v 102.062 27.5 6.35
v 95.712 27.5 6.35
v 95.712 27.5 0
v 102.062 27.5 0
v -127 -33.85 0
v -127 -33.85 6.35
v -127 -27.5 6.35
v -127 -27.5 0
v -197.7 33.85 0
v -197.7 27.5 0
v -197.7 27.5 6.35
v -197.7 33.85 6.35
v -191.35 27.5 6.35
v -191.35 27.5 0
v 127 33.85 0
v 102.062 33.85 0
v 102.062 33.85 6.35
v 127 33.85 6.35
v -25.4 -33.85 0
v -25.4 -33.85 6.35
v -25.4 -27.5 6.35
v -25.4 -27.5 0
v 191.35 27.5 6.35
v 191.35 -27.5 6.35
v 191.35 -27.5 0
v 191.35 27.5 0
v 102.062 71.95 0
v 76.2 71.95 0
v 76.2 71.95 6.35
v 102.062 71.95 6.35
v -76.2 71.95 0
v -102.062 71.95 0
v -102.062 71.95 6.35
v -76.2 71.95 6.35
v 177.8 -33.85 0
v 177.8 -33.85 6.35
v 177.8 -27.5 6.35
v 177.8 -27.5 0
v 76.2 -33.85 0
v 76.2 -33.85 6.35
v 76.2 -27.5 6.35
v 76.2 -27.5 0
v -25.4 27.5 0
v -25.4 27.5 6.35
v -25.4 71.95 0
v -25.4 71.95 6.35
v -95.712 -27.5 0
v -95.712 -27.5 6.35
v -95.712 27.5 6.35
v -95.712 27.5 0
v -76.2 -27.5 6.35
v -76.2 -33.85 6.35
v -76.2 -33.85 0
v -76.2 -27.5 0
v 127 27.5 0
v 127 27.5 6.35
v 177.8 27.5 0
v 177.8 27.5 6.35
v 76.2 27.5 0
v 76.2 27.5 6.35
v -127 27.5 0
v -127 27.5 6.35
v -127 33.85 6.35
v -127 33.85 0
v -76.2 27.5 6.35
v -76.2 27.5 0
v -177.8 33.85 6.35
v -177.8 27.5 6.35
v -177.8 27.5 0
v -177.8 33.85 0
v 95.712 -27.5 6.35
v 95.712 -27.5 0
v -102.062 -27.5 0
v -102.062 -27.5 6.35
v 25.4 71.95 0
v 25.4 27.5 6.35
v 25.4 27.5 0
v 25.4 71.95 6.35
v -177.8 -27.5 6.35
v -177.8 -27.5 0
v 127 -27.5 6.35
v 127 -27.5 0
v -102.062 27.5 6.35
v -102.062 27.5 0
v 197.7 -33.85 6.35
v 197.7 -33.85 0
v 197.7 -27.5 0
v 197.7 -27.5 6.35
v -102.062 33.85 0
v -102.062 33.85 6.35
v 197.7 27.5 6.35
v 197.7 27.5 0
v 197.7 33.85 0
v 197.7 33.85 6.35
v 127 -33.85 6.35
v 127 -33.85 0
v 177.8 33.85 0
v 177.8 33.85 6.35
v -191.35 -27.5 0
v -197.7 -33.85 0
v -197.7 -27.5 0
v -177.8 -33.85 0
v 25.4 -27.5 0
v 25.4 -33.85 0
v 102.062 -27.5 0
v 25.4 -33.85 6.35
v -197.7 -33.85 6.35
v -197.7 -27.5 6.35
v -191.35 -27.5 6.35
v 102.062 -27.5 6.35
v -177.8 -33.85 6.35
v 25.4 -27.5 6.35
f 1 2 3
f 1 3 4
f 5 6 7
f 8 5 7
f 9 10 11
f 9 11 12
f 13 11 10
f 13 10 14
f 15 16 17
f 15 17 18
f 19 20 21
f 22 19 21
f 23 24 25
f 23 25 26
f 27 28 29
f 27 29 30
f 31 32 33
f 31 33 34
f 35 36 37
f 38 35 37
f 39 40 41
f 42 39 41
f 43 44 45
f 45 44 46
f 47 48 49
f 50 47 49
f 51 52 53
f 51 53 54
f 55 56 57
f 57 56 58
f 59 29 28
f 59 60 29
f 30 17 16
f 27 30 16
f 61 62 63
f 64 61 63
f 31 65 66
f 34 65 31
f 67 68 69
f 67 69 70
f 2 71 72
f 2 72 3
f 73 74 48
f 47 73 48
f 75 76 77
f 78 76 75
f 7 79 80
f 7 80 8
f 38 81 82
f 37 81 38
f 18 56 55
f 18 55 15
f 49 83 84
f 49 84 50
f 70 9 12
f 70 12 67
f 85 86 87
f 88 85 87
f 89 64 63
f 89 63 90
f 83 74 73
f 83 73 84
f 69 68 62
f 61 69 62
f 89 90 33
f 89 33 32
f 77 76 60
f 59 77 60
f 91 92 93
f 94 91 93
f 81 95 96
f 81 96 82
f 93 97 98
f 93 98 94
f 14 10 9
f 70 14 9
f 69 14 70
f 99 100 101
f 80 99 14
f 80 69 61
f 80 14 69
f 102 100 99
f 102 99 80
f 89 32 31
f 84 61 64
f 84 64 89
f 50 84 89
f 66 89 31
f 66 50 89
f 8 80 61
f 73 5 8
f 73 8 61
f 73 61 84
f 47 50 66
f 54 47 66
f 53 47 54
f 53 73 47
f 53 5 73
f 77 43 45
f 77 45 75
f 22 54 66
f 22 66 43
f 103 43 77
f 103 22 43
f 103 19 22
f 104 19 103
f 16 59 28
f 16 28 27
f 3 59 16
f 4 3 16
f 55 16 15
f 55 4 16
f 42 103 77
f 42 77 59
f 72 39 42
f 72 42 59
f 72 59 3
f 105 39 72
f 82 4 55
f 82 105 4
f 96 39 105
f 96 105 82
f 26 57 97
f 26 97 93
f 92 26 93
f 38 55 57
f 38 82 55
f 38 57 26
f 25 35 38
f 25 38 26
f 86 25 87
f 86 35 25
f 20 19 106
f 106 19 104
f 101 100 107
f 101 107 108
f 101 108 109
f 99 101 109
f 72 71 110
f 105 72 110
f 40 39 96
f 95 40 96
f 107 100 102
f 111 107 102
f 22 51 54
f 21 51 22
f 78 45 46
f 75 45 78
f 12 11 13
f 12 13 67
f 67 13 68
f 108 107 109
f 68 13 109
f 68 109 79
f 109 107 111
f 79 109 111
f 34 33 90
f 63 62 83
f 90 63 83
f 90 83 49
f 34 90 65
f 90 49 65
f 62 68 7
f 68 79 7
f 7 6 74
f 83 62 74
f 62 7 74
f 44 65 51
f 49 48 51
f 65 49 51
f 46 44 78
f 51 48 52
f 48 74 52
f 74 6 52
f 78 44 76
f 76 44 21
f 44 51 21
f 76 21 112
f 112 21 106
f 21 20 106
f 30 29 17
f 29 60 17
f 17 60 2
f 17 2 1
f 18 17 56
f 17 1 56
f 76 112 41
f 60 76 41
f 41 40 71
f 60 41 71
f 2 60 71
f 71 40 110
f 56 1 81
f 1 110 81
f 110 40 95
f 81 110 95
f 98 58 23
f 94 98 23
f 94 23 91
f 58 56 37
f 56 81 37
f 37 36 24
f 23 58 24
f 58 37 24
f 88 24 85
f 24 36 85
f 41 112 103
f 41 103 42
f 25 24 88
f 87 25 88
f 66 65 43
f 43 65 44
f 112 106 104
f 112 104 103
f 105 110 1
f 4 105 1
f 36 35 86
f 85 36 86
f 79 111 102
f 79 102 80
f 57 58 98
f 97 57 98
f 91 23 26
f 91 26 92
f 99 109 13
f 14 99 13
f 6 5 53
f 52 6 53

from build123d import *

# Parameters (mm, degrees)
SKETCH1_W           = 395.4
SKETCH1_H           = 67.700000012
BOSS_EXTRUDE1_DEPTH = 6.35
SKETCH2_W           = 50.8
SKETCH2_H           = 6.35
SKETCH2_W_2         = 6.35
SKETCH2_H_2         = 55.000000012
CUT_EXTRUDE1_DEPTH  = 201.677440188
SKETCH5_W           = 6.35
SKETCH5_H           = 55.000000012
CUT_EXTRUDE2_DEPTH  = 201.677440188
SKETCH6_W           = 25.8625
SKETCH6_H           = 6.35
SKETCH6_W_2         = 50.8
BOSS_EXTRUDE2_DEPTH = 38.1


with BuildPart() as part:
    # Sketch1 → Boss-Extrude1 (new body)
    with BuildSketch(Plane.XY):
        Rectangle(SKETCH1_W, SKETCH1_H)
    extrude(amount=BOSS_EXTRUDE1_DEPTH)

    # Sketch2 → Cut-Extrude1 (cut, through all)
    with BuildSketch(Plane.XY.offset(6.35)):
        with Locations((-152.4, -30.675000006)):
            Rectangle(SKETCH2_W, SKETCH2_H)
        with Locations((-152.4, 30.675000006)):
            Rectangle(SKETCH2_W, SKETCH2_H)
        with Locations((-50.8, 30.675000006)):
            Rectangle(SKETCH2_W, SKETCH2_H)
        with Locations((-50.8, -30.675000006)):
            Rectangle(SKETCH2_W, SKETCH2_H)
        with Locations((50.8, -30.675000006)):
            Rectangle(SKETCH2_W, SKETCH2_H)
        with Locations((50.8, 30.675000006)):
            Rectangle(SKETCH2_W, SKETCH2_H)
        with Locations((152.4, 30.675000006)):
            Rectangle(SKETCH2_W, SKETCH2_H)
        with Locations((152.4, -30.675000006)):
            Rectangle(SKETCH2_W, SKETCH2_H)
        with Locations((-98.8875, 0)):
            Rectangle(SKETCH2_W_2, SKETCH2_H_2)
        with Locations((98.8875, 0)):
            Rectangle(SKETCH2_W_2, SKETCH2_H_2)
    extrude(amount=-CUT_EXTRUDE1_DEPTH, mode=Mode.SUBTRACT)

    # Sketch5 → Cut-Extrude2 (cut, through all)
    with BuildSketch(Plane.XY.offset(6.35)):
        with Locations((-194.525, 0)):
            Rectangle(SKETCH5_W, SKETCH5_H)
        with Locations((194.525, 0)):
            Rectangle(SKETCH5_W, SKETCH5_H)
    extrude(amount=-CUT_EXTRUDE2_DEPTH, mode=Mode.SUBTRACT)

    # Sketch6 → Boss-Extrude2 (add)
    with BuildSketch(Plane(origin=(0, 33.850000006, 0), x_dir=(1, 0, 0), z_dir=(0, 1, 0))):
        with Locations((89.13125, -3.175)):
            Rectangle(SKETCH6_W, SKETCH6_H)
        with Locations((0, -3.175)):
            Rectangle(SKETCH6_W_2, SKETCH6_H)
        with Locations((-89.13125, -3.175)):
            Rectangle(SKETCH6_W, SKETCH6_H)
    extrude(amount=BOSS_EXTRUDE2_DEPTH)


solid = part.part
